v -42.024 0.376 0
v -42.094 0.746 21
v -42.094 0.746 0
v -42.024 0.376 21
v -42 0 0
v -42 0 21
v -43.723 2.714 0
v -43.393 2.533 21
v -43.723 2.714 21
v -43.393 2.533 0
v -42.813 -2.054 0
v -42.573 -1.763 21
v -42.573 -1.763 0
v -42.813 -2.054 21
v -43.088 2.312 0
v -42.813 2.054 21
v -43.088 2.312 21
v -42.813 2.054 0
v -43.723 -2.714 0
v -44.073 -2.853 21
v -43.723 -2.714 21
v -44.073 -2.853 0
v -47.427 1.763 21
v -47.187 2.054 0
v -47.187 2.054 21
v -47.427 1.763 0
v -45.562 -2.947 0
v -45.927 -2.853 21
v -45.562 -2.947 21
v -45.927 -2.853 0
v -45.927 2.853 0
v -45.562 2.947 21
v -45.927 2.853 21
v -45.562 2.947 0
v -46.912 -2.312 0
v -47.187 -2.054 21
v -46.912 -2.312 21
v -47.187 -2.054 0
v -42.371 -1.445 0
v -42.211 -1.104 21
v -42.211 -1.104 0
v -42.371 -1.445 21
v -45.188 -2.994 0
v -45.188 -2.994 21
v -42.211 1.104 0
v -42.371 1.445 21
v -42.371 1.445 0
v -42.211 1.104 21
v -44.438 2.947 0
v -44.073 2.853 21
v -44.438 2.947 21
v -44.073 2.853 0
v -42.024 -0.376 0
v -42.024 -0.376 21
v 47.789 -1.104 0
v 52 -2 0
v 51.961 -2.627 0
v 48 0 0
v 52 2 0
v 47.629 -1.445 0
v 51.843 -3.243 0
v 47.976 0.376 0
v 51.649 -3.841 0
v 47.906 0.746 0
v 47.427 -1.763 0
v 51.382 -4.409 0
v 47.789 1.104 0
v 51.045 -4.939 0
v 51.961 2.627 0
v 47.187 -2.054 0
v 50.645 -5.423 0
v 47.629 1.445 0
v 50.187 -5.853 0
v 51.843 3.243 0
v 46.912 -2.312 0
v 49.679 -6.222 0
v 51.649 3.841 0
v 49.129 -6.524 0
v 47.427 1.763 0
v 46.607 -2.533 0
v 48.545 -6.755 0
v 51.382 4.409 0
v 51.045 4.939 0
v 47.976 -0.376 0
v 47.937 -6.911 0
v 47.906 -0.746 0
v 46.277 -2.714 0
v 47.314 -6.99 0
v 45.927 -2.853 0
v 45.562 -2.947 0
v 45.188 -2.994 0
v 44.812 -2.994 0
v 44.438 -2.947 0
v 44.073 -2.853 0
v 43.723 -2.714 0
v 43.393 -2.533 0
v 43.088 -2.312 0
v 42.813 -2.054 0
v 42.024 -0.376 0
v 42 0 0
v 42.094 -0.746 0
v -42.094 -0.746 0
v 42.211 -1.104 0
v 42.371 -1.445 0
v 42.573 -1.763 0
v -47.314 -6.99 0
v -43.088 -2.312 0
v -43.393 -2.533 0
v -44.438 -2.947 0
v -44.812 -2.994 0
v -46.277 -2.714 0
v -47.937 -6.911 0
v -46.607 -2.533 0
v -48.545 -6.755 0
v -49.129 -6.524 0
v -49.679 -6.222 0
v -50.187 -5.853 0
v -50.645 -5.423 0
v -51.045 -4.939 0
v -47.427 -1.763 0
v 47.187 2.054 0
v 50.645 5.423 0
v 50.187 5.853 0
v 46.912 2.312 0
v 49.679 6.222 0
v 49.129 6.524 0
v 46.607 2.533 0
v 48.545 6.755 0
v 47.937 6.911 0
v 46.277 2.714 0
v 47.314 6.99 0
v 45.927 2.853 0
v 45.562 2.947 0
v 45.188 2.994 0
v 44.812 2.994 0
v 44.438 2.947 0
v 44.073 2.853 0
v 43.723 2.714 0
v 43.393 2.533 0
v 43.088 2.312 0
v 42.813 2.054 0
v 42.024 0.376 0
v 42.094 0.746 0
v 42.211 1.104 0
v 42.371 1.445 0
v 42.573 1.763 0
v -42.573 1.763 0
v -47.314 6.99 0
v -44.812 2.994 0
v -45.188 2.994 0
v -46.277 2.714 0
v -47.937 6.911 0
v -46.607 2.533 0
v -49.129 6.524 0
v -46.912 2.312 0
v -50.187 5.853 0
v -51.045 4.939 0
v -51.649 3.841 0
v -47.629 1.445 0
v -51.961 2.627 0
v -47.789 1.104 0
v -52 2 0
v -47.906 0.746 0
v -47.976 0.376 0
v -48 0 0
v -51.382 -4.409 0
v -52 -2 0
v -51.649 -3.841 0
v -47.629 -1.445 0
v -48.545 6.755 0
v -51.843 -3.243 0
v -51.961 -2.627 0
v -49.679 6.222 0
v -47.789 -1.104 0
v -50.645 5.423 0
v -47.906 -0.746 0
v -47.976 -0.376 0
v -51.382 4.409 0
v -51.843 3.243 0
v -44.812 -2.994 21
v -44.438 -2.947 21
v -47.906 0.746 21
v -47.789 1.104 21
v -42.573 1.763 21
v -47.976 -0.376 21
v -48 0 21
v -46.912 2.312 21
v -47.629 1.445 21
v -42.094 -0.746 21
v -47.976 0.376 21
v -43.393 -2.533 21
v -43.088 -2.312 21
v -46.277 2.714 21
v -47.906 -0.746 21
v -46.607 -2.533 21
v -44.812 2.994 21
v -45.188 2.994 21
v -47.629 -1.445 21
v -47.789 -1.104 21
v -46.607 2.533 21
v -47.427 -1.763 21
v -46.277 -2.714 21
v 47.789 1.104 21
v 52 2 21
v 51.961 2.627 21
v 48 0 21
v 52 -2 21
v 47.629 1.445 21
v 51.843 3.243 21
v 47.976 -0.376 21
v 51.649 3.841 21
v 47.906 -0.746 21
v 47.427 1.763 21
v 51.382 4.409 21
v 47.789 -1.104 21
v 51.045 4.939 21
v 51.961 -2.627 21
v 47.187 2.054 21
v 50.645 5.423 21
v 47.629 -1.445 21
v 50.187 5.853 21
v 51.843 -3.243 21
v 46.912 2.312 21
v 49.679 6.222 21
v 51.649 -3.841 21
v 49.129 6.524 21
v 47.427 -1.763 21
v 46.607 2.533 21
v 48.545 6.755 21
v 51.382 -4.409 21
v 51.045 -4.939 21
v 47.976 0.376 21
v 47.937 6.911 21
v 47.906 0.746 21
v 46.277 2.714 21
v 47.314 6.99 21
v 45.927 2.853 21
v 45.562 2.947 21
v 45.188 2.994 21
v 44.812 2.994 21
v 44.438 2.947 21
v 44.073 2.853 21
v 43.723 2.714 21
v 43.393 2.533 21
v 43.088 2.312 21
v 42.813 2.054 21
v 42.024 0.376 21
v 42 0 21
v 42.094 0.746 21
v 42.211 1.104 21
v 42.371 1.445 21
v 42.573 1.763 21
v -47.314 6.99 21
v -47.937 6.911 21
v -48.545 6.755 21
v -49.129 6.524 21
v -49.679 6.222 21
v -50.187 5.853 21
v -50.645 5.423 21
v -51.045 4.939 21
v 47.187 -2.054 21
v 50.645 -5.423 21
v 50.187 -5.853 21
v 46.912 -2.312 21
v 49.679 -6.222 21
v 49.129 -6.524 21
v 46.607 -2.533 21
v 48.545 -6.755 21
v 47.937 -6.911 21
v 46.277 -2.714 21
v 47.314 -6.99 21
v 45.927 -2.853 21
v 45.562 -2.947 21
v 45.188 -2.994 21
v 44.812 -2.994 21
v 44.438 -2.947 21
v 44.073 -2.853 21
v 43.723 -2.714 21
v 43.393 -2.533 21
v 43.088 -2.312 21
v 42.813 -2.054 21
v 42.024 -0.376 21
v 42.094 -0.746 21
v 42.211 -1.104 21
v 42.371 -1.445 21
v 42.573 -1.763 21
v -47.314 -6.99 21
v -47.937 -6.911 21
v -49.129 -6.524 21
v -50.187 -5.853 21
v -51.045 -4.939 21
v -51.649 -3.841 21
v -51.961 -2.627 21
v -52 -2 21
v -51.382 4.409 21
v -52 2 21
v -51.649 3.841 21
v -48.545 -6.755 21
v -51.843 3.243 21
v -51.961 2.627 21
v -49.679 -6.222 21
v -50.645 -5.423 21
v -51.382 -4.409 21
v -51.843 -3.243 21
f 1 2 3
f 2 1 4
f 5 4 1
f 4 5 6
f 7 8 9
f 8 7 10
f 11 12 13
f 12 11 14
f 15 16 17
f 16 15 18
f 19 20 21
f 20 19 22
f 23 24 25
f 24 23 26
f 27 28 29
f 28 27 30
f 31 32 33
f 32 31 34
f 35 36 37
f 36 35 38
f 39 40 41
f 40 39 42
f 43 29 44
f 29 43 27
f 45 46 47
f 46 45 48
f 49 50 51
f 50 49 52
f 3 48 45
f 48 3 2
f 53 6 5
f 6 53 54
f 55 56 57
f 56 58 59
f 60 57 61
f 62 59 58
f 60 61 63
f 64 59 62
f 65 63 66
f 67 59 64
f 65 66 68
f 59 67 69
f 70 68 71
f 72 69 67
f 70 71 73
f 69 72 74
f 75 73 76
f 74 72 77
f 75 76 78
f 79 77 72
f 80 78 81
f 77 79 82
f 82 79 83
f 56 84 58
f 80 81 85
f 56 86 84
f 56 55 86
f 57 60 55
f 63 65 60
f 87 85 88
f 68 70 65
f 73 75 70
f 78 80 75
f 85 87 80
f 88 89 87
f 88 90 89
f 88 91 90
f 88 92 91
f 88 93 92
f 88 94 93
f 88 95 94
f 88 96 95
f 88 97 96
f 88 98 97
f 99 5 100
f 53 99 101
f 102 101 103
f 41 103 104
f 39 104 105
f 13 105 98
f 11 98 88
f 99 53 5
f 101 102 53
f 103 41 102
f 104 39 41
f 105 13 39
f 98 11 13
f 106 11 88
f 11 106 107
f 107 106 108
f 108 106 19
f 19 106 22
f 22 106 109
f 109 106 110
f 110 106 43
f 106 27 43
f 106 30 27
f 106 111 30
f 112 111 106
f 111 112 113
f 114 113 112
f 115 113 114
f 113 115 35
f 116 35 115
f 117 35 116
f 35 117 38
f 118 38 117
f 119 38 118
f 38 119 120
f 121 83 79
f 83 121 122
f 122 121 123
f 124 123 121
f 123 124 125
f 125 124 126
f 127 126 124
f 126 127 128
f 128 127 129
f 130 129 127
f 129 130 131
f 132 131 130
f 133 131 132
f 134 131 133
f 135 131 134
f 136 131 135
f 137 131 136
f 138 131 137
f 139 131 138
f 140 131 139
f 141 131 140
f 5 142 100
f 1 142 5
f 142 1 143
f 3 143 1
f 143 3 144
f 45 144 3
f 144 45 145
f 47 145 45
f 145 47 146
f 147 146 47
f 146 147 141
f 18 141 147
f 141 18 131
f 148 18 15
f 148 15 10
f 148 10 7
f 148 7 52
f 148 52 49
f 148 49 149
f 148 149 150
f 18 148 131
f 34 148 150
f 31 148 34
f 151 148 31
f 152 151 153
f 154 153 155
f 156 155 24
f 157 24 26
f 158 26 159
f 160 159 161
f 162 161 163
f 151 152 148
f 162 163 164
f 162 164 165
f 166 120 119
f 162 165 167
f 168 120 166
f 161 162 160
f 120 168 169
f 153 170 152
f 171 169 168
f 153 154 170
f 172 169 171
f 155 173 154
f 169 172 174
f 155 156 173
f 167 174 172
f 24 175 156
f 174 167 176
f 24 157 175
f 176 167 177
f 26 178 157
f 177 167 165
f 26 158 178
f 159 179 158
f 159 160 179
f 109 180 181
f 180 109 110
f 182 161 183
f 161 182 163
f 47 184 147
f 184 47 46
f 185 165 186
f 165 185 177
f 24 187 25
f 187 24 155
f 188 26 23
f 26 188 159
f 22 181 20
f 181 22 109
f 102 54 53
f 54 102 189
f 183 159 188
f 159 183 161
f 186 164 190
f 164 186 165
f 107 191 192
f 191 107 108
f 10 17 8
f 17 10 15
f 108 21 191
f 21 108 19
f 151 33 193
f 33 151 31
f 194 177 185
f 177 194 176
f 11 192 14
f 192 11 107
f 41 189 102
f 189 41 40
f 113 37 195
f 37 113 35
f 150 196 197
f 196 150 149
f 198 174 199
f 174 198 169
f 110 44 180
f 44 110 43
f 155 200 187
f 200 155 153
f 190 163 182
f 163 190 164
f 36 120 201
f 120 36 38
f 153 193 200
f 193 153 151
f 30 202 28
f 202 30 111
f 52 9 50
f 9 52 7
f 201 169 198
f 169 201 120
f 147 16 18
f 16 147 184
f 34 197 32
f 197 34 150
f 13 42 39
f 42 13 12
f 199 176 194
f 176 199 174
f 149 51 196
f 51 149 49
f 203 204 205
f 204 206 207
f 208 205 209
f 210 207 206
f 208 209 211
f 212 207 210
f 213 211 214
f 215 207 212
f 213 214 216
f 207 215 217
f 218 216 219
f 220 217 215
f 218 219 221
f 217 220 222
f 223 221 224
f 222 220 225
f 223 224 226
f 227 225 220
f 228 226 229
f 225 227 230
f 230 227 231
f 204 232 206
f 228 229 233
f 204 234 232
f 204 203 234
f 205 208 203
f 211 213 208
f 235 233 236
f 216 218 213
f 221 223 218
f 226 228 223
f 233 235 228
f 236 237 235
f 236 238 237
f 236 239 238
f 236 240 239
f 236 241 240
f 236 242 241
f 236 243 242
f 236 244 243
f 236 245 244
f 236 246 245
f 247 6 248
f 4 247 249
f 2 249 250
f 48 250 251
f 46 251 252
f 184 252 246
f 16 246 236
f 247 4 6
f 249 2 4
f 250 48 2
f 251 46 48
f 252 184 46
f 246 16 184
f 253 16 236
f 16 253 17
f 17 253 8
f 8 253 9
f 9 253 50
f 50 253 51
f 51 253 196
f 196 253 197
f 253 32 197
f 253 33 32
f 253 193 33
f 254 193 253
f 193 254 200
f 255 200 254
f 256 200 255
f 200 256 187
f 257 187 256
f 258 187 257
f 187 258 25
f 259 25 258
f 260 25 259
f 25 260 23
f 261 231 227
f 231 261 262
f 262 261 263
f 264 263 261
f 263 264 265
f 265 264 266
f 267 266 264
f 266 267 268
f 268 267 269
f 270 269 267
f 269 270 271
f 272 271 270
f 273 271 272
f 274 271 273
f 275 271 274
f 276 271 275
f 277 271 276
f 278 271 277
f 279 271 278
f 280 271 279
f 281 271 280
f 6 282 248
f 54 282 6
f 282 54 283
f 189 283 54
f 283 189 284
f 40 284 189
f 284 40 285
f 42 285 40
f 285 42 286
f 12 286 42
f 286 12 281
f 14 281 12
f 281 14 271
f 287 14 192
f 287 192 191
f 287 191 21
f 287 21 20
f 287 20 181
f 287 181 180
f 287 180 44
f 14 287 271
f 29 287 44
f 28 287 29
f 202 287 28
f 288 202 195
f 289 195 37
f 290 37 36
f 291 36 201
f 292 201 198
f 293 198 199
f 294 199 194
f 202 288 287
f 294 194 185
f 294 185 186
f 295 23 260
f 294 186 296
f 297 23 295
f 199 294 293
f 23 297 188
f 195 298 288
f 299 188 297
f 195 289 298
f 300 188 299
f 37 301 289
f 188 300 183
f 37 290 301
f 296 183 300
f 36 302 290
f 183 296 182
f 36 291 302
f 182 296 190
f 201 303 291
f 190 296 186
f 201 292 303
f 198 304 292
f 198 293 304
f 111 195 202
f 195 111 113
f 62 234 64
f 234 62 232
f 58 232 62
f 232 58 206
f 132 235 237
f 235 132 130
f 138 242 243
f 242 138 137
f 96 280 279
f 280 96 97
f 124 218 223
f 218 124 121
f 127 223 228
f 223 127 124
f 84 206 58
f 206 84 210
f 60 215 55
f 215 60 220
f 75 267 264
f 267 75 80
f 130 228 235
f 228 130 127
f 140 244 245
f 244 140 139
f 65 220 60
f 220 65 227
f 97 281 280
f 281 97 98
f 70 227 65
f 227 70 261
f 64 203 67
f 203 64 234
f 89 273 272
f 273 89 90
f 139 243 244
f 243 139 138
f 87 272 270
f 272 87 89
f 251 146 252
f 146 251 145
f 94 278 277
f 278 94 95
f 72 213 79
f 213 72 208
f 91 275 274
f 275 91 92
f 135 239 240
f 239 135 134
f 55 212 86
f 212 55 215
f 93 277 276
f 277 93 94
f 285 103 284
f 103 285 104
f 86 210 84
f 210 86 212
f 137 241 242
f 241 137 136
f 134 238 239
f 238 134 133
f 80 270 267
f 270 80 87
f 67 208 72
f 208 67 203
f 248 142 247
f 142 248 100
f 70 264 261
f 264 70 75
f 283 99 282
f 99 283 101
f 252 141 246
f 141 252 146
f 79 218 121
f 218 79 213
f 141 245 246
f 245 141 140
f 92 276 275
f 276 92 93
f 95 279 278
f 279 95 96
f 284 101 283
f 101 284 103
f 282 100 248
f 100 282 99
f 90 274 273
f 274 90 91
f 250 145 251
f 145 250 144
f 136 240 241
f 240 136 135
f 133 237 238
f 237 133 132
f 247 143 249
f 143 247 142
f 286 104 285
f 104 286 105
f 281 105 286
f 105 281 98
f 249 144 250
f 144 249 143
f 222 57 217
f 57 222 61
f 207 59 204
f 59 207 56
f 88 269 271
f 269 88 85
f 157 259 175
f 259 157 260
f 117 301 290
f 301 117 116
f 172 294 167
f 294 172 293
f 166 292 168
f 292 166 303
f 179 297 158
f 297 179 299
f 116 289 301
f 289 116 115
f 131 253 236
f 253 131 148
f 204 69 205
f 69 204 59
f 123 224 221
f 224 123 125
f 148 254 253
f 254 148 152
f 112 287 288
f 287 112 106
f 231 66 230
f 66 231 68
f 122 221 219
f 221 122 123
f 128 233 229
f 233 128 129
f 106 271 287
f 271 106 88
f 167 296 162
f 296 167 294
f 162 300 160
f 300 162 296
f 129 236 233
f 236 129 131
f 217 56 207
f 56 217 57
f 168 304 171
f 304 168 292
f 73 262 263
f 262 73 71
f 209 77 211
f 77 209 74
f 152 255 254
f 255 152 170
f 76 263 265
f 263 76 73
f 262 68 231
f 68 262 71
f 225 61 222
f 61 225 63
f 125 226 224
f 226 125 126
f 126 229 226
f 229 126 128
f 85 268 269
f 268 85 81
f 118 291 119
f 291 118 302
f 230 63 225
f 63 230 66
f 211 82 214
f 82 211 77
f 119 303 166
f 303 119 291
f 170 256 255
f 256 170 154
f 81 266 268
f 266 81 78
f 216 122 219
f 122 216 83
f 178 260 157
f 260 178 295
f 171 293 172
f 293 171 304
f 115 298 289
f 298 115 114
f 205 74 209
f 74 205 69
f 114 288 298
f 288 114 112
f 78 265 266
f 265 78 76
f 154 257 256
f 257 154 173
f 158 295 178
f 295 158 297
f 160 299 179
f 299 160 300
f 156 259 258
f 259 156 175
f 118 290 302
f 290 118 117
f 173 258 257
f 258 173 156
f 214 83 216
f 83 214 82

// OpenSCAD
$fn = 50;


difference() {
	union() {
		hull() {
			translate(v = [-47.0000000000, 2.0000000000, 0]) {
				cylinder(h = 21, r = 5);
			}
			translate(v = [47.0000000000, 2.0000000000, 0]) {
				cylinder(h = 21, r = 5);
			}
			translate(v = [-47.0000000000, -2.0000000000, 0]) {
				cylinder(h = 21, r = 5);
			}
			translate(v = [47.0000000000, -2.0000000000, 0]) {
				cylinder(h = 21, r = 5);
			}
		}
	}
	union() {
		translate(v = [-45.0000000000, 0.0000000000, 0]) {
			cylinder(h = 21, r = 3.0000000000);
		}
		translate(v = [45.0000000000, 0.0000000000, 0]) {
			cylinder(h = 21, r = 3.0000000000);
		}
		translate(v = [-45.0000000000, 0.0000000000, 0]) {
			cylinder(h = 21, r = 1.5000000000);
		}
		translate(v = [45.0000000000, 0.0000000000, 0]) {
			cylinder(h = 21, r = 1.5000000000);
		}
		translate(v = [-45.0000000000, 0.0000000000, 0]) {
			cylinder(h = 21, r = 1.5000000000);
		}
		translate(v = [45.0000000000, 0.0000000000, 0]) {
			cylinder(h = 21, r = 1.5000000000);
		}
		translate(v = [-45.0000000000, 0.0000000000, 0]) {
			cylinder(h = 21, r = 1.5000000000);
		}
		translate(v = [45.0000000000, 0.0000000000, 0]) {
			cylinder(h = 21, r = 1.5000000000);
		}
	}
}
